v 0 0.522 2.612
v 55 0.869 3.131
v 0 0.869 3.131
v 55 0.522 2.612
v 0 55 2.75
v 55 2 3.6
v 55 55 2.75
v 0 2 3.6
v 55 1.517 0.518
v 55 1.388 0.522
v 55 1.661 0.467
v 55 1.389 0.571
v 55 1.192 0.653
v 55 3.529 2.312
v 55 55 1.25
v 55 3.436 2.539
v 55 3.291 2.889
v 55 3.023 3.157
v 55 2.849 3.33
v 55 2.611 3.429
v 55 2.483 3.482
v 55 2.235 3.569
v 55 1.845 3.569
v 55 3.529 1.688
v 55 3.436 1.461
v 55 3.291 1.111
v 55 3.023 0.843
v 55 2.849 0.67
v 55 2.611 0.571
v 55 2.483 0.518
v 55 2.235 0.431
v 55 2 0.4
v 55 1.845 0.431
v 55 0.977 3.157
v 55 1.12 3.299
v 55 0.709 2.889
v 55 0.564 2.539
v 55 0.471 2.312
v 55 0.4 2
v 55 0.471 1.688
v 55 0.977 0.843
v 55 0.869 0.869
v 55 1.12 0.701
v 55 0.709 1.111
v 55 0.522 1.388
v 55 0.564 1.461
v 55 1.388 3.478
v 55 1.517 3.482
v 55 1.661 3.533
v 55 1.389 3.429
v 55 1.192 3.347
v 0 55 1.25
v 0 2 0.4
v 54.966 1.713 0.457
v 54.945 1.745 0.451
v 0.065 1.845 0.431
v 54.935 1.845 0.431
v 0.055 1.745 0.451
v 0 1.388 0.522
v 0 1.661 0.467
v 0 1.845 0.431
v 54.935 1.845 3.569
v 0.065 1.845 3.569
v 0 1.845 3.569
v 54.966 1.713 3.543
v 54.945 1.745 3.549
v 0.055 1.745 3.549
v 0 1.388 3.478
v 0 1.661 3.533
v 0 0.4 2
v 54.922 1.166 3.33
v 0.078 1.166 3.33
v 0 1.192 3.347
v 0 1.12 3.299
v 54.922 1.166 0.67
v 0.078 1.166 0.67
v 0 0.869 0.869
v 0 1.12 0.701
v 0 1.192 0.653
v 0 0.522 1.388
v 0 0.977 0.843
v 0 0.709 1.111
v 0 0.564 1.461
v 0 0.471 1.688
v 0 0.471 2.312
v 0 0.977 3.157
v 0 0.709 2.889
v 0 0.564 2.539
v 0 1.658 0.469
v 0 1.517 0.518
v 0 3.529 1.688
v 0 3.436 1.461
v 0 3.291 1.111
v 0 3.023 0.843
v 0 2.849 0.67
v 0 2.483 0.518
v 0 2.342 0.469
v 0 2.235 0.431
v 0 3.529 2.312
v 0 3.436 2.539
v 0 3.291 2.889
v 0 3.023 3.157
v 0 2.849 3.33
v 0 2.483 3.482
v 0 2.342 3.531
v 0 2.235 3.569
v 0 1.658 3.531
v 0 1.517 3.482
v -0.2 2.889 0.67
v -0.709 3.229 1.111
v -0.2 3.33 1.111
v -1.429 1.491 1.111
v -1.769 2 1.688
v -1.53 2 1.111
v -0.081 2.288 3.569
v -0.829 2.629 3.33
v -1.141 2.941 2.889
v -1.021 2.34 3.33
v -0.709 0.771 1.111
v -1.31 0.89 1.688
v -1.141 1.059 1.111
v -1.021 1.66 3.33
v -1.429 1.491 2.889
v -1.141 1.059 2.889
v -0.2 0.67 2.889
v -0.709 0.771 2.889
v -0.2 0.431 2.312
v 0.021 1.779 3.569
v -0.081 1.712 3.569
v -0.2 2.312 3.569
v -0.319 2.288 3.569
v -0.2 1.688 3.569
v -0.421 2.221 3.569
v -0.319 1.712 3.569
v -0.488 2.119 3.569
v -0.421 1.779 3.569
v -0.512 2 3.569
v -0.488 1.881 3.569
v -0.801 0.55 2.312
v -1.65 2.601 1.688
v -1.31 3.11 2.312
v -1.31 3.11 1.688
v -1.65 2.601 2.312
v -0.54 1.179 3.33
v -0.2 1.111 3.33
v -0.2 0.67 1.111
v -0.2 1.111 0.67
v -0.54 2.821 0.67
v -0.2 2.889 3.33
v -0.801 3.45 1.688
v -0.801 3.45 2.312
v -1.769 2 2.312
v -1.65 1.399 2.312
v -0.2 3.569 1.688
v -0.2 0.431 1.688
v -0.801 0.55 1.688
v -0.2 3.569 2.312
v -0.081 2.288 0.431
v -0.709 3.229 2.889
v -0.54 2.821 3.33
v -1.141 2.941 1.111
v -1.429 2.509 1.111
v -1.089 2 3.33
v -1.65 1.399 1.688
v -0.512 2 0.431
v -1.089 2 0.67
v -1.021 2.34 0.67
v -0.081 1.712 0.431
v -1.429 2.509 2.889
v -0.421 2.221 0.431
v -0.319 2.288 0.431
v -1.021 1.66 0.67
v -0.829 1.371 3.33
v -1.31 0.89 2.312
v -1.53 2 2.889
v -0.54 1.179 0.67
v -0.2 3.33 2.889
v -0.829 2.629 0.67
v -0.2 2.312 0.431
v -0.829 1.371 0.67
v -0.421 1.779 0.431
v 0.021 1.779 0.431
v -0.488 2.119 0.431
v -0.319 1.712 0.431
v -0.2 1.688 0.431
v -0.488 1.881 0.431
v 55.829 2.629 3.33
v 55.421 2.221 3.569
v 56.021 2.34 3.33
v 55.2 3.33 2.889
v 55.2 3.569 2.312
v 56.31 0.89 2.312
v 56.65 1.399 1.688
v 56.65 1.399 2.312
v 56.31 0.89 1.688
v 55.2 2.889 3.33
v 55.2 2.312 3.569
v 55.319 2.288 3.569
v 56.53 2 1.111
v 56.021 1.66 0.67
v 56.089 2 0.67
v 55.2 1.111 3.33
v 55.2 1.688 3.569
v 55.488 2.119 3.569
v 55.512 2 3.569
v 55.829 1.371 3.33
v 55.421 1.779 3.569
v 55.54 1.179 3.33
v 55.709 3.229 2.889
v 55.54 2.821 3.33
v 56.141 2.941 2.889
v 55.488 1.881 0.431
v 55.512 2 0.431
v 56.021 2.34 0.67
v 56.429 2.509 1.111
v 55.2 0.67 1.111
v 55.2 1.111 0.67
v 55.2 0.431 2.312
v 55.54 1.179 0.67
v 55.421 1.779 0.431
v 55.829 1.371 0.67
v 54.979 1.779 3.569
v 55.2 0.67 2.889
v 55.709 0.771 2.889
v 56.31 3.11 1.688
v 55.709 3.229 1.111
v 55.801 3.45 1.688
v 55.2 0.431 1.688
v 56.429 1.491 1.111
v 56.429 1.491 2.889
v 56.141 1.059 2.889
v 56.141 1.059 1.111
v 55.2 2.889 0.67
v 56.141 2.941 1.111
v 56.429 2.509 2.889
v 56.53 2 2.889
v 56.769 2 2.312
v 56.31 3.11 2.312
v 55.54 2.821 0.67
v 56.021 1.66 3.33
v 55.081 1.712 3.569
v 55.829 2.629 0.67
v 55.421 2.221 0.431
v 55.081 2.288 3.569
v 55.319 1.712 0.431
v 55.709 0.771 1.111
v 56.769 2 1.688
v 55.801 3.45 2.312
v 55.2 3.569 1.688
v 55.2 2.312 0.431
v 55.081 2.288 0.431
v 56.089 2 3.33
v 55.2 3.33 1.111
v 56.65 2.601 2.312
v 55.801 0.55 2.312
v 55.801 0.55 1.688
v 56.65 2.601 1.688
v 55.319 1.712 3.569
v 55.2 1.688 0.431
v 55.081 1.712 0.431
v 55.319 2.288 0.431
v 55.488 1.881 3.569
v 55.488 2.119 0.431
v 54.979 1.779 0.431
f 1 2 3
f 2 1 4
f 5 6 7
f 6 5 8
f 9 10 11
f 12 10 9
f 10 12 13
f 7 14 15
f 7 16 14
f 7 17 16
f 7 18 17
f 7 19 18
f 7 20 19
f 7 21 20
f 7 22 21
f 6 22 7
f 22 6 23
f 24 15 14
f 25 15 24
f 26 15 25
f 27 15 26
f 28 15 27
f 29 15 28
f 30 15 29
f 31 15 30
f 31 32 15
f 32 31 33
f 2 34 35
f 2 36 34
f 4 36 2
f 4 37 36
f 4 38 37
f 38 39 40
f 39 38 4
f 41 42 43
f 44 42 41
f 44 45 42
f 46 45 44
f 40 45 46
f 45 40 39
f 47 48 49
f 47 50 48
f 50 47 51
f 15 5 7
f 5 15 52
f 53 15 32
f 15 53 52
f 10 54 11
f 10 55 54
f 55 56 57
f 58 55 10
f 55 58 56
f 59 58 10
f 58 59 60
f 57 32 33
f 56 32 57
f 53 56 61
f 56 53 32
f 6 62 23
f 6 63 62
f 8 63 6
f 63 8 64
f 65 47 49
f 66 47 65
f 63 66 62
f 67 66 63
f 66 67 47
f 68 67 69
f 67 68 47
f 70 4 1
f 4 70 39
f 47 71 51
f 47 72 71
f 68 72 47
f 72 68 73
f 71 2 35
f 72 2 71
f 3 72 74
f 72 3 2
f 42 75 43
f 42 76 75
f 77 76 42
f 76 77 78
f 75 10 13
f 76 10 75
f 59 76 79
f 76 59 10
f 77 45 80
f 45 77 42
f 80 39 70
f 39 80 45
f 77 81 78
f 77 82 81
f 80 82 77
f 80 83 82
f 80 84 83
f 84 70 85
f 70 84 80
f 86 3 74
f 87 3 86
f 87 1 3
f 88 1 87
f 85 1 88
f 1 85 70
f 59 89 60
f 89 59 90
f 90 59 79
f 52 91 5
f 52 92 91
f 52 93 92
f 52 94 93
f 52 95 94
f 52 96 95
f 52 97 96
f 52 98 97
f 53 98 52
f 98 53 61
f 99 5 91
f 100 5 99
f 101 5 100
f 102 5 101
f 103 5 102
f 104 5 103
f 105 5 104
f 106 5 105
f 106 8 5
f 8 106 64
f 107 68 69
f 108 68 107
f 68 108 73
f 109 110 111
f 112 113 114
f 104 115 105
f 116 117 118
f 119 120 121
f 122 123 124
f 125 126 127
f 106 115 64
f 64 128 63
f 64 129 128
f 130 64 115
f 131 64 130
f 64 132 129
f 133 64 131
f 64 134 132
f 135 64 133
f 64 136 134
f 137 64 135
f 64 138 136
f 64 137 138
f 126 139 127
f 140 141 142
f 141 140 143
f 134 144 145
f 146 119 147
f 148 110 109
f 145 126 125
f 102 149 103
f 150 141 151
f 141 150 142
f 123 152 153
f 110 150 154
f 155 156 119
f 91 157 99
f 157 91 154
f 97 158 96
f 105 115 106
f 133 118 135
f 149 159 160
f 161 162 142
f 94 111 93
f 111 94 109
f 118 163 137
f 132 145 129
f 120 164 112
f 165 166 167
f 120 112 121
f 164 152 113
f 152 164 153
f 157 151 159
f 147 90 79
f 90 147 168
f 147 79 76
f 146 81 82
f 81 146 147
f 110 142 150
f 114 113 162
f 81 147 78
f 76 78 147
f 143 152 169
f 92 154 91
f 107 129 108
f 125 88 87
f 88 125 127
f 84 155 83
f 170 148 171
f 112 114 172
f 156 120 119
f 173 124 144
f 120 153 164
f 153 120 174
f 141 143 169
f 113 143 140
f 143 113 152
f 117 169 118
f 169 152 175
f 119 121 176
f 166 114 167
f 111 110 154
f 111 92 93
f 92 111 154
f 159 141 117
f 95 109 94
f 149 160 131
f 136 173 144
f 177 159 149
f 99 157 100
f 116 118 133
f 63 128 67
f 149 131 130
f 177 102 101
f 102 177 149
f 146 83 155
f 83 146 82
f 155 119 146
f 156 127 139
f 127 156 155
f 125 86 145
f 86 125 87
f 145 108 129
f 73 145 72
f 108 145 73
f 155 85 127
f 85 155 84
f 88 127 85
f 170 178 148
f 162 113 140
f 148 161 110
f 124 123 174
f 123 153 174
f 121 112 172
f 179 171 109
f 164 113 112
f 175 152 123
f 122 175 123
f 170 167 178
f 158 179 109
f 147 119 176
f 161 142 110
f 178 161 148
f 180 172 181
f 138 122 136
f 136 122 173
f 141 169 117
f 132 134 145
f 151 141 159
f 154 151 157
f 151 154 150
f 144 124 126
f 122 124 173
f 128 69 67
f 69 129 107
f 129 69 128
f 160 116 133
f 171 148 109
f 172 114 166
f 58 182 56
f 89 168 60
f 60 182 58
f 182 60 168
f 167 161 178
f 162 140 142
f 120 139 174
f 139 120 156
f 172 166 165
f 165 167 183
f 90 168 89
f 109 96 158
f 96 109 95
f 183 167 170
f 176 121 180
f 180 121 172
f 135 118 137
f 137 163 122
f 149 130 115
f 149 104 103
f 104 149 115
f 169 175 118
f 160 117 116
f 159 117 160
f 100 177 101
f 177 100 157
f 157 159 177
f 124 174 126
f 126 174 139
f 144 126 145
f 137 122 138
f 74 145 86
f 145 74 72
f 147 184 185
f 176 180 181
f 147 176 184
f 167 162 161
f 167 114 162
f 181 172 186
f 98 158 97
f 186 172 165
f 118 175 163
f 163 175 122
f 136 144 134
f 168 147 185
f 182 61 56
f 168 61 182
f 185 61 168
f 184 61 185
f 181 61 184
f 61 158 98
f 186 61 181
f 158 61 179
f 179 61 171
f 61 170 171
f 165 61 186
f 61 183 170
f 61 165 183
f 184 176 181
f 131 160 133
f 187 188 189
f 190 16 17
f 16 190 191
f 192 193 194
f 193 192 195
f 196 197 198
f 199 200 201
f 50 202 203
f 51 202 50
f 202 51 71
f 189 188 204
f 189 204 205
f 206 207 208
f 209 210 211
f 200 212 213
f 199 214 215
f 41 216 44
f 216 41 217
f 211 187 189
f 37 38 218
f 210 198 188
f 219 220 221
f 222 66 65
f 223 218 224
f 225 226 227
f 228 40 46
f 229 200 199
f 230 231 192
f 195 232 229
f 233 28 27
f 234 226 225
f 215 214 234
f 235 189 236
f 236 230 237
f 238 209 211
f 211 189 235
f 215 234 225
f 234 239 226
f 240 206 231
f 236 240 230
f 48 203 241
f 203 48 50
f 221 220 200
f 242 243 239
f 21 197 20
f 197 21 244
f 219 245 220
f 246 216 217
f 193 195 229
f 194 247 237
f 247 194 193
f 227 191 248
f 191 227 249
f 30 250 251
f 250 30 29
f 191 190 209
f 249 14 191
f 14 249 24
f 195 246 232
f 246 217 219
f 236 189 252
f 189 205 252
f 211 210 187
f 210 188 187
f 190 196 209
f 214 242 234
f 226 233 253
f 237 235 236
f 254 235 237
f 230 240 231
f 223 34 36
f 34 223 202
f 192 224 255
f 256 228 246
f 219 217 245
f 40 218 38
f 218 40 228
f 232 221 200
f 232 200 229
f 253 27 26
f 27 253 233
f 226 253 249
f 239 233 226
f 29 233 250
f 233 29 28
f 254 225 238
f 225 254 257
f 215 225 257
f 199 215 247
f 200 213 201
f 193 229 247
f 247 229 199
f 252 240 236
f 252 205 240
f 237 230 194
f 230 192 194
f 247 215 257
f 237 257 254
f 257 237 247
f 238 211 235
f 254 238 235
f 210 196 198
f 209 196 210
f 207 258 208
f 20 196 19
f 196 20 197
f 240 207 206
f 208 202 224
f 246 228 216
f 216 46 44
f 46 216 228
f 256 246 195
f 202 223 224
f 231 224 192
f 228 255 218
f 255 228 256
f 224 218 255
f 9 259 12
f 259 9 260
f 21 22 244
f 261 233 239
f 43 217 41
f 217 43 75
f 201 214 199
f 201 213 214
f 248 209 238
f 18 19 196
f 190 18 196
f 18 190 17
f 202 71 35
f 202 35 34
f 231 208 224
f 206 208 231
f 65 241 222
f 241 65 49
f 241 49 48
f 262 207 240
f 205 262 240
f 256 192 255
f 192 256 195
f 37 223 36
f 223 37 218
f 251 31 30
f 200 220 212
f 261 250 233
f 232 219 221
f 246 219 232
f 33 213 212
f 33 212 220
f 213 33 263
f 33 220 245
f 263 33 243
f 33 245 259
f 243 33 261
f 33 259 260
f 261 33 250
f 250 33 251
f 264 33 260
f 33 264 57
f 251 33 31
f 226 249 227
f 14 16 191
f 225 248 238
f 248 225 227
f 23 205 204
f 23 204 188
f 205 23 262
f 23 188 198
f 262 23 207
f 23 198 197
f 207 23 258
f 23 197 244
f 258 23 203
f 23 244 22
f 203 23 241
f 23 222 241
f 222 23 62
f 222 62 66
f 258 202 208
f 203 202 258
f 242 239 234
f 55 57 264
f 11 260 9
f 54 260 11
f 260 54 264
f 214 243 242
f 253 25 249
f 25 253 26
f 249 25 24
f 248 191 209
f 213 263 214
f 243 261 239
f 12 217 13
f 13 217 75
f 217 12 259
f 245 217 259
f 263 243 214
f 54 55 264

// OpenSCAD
// file: parameters.scad
// unit: 1 = 1 mm
eps = 0.01;  // prevent z-fighting
tolerance = 0.4;  // printer's accurarcy
circle_edge = 16;  // approximate a circle with a n-gon

// dimensions of the lever that holds floor upright
lever_width = 3;  
lever_length = 15;

// size of a container box
box_size = 60;
wall_thickness = 1.5;
// main file
include<parameters.scad>

module hinged_floor(outer_size, thickness, gap, hinge_radius) {
  size = outer_size - 2 * (thickness + gap);
  r = hinge_radius - tolerance;

  union() {
    hull() {
      translate([0, hinge_radius, hinge_radius - thickness / 2]) {
        cube([size, size - hinge_radius, thickness]);
      }
      // connect hinge balls to the floor body
      translate([0, hinge_radius, hinge_radius]) {
        rotate(90, [0, 1, 0]) {
          cylinder(size, r, r, $fn=circle_edge);
        }
      }
    }

    // add hinge balls
    translate([-gap + r / 2, hinge_radius, hinge_radius]) {
      sphere(r, $fn=circle_edge);
    }
    translate([size + gap - r/2, hinge_radius, hinge_radius]) {
      sphere(r, $fn=circle_edge);
    }
  }
}

module rounded_sheet(xsize, ysize, thickness) {
  union() {
    translate([0, thickness / 2, 0]) {
      cube([xsize, ysize - thickness, thickness]);
    }
    radius = thickness / 2;
    translate([0, radius, radius]) {
      rotate(90, [0, 1, 0]) {
        cylinder(xsize, radius, radius, $fn=circle_edge);
      }
    }
    translate([0, ysize - radius, radius]) {
      rotate(90, [0, 1, 0]) {
        cylinder(xsize, radius, radius, $fn=circle_edge);
      }
    }
  }
}

hinged_floor(box_size, wall_thickness, 1, 2);
